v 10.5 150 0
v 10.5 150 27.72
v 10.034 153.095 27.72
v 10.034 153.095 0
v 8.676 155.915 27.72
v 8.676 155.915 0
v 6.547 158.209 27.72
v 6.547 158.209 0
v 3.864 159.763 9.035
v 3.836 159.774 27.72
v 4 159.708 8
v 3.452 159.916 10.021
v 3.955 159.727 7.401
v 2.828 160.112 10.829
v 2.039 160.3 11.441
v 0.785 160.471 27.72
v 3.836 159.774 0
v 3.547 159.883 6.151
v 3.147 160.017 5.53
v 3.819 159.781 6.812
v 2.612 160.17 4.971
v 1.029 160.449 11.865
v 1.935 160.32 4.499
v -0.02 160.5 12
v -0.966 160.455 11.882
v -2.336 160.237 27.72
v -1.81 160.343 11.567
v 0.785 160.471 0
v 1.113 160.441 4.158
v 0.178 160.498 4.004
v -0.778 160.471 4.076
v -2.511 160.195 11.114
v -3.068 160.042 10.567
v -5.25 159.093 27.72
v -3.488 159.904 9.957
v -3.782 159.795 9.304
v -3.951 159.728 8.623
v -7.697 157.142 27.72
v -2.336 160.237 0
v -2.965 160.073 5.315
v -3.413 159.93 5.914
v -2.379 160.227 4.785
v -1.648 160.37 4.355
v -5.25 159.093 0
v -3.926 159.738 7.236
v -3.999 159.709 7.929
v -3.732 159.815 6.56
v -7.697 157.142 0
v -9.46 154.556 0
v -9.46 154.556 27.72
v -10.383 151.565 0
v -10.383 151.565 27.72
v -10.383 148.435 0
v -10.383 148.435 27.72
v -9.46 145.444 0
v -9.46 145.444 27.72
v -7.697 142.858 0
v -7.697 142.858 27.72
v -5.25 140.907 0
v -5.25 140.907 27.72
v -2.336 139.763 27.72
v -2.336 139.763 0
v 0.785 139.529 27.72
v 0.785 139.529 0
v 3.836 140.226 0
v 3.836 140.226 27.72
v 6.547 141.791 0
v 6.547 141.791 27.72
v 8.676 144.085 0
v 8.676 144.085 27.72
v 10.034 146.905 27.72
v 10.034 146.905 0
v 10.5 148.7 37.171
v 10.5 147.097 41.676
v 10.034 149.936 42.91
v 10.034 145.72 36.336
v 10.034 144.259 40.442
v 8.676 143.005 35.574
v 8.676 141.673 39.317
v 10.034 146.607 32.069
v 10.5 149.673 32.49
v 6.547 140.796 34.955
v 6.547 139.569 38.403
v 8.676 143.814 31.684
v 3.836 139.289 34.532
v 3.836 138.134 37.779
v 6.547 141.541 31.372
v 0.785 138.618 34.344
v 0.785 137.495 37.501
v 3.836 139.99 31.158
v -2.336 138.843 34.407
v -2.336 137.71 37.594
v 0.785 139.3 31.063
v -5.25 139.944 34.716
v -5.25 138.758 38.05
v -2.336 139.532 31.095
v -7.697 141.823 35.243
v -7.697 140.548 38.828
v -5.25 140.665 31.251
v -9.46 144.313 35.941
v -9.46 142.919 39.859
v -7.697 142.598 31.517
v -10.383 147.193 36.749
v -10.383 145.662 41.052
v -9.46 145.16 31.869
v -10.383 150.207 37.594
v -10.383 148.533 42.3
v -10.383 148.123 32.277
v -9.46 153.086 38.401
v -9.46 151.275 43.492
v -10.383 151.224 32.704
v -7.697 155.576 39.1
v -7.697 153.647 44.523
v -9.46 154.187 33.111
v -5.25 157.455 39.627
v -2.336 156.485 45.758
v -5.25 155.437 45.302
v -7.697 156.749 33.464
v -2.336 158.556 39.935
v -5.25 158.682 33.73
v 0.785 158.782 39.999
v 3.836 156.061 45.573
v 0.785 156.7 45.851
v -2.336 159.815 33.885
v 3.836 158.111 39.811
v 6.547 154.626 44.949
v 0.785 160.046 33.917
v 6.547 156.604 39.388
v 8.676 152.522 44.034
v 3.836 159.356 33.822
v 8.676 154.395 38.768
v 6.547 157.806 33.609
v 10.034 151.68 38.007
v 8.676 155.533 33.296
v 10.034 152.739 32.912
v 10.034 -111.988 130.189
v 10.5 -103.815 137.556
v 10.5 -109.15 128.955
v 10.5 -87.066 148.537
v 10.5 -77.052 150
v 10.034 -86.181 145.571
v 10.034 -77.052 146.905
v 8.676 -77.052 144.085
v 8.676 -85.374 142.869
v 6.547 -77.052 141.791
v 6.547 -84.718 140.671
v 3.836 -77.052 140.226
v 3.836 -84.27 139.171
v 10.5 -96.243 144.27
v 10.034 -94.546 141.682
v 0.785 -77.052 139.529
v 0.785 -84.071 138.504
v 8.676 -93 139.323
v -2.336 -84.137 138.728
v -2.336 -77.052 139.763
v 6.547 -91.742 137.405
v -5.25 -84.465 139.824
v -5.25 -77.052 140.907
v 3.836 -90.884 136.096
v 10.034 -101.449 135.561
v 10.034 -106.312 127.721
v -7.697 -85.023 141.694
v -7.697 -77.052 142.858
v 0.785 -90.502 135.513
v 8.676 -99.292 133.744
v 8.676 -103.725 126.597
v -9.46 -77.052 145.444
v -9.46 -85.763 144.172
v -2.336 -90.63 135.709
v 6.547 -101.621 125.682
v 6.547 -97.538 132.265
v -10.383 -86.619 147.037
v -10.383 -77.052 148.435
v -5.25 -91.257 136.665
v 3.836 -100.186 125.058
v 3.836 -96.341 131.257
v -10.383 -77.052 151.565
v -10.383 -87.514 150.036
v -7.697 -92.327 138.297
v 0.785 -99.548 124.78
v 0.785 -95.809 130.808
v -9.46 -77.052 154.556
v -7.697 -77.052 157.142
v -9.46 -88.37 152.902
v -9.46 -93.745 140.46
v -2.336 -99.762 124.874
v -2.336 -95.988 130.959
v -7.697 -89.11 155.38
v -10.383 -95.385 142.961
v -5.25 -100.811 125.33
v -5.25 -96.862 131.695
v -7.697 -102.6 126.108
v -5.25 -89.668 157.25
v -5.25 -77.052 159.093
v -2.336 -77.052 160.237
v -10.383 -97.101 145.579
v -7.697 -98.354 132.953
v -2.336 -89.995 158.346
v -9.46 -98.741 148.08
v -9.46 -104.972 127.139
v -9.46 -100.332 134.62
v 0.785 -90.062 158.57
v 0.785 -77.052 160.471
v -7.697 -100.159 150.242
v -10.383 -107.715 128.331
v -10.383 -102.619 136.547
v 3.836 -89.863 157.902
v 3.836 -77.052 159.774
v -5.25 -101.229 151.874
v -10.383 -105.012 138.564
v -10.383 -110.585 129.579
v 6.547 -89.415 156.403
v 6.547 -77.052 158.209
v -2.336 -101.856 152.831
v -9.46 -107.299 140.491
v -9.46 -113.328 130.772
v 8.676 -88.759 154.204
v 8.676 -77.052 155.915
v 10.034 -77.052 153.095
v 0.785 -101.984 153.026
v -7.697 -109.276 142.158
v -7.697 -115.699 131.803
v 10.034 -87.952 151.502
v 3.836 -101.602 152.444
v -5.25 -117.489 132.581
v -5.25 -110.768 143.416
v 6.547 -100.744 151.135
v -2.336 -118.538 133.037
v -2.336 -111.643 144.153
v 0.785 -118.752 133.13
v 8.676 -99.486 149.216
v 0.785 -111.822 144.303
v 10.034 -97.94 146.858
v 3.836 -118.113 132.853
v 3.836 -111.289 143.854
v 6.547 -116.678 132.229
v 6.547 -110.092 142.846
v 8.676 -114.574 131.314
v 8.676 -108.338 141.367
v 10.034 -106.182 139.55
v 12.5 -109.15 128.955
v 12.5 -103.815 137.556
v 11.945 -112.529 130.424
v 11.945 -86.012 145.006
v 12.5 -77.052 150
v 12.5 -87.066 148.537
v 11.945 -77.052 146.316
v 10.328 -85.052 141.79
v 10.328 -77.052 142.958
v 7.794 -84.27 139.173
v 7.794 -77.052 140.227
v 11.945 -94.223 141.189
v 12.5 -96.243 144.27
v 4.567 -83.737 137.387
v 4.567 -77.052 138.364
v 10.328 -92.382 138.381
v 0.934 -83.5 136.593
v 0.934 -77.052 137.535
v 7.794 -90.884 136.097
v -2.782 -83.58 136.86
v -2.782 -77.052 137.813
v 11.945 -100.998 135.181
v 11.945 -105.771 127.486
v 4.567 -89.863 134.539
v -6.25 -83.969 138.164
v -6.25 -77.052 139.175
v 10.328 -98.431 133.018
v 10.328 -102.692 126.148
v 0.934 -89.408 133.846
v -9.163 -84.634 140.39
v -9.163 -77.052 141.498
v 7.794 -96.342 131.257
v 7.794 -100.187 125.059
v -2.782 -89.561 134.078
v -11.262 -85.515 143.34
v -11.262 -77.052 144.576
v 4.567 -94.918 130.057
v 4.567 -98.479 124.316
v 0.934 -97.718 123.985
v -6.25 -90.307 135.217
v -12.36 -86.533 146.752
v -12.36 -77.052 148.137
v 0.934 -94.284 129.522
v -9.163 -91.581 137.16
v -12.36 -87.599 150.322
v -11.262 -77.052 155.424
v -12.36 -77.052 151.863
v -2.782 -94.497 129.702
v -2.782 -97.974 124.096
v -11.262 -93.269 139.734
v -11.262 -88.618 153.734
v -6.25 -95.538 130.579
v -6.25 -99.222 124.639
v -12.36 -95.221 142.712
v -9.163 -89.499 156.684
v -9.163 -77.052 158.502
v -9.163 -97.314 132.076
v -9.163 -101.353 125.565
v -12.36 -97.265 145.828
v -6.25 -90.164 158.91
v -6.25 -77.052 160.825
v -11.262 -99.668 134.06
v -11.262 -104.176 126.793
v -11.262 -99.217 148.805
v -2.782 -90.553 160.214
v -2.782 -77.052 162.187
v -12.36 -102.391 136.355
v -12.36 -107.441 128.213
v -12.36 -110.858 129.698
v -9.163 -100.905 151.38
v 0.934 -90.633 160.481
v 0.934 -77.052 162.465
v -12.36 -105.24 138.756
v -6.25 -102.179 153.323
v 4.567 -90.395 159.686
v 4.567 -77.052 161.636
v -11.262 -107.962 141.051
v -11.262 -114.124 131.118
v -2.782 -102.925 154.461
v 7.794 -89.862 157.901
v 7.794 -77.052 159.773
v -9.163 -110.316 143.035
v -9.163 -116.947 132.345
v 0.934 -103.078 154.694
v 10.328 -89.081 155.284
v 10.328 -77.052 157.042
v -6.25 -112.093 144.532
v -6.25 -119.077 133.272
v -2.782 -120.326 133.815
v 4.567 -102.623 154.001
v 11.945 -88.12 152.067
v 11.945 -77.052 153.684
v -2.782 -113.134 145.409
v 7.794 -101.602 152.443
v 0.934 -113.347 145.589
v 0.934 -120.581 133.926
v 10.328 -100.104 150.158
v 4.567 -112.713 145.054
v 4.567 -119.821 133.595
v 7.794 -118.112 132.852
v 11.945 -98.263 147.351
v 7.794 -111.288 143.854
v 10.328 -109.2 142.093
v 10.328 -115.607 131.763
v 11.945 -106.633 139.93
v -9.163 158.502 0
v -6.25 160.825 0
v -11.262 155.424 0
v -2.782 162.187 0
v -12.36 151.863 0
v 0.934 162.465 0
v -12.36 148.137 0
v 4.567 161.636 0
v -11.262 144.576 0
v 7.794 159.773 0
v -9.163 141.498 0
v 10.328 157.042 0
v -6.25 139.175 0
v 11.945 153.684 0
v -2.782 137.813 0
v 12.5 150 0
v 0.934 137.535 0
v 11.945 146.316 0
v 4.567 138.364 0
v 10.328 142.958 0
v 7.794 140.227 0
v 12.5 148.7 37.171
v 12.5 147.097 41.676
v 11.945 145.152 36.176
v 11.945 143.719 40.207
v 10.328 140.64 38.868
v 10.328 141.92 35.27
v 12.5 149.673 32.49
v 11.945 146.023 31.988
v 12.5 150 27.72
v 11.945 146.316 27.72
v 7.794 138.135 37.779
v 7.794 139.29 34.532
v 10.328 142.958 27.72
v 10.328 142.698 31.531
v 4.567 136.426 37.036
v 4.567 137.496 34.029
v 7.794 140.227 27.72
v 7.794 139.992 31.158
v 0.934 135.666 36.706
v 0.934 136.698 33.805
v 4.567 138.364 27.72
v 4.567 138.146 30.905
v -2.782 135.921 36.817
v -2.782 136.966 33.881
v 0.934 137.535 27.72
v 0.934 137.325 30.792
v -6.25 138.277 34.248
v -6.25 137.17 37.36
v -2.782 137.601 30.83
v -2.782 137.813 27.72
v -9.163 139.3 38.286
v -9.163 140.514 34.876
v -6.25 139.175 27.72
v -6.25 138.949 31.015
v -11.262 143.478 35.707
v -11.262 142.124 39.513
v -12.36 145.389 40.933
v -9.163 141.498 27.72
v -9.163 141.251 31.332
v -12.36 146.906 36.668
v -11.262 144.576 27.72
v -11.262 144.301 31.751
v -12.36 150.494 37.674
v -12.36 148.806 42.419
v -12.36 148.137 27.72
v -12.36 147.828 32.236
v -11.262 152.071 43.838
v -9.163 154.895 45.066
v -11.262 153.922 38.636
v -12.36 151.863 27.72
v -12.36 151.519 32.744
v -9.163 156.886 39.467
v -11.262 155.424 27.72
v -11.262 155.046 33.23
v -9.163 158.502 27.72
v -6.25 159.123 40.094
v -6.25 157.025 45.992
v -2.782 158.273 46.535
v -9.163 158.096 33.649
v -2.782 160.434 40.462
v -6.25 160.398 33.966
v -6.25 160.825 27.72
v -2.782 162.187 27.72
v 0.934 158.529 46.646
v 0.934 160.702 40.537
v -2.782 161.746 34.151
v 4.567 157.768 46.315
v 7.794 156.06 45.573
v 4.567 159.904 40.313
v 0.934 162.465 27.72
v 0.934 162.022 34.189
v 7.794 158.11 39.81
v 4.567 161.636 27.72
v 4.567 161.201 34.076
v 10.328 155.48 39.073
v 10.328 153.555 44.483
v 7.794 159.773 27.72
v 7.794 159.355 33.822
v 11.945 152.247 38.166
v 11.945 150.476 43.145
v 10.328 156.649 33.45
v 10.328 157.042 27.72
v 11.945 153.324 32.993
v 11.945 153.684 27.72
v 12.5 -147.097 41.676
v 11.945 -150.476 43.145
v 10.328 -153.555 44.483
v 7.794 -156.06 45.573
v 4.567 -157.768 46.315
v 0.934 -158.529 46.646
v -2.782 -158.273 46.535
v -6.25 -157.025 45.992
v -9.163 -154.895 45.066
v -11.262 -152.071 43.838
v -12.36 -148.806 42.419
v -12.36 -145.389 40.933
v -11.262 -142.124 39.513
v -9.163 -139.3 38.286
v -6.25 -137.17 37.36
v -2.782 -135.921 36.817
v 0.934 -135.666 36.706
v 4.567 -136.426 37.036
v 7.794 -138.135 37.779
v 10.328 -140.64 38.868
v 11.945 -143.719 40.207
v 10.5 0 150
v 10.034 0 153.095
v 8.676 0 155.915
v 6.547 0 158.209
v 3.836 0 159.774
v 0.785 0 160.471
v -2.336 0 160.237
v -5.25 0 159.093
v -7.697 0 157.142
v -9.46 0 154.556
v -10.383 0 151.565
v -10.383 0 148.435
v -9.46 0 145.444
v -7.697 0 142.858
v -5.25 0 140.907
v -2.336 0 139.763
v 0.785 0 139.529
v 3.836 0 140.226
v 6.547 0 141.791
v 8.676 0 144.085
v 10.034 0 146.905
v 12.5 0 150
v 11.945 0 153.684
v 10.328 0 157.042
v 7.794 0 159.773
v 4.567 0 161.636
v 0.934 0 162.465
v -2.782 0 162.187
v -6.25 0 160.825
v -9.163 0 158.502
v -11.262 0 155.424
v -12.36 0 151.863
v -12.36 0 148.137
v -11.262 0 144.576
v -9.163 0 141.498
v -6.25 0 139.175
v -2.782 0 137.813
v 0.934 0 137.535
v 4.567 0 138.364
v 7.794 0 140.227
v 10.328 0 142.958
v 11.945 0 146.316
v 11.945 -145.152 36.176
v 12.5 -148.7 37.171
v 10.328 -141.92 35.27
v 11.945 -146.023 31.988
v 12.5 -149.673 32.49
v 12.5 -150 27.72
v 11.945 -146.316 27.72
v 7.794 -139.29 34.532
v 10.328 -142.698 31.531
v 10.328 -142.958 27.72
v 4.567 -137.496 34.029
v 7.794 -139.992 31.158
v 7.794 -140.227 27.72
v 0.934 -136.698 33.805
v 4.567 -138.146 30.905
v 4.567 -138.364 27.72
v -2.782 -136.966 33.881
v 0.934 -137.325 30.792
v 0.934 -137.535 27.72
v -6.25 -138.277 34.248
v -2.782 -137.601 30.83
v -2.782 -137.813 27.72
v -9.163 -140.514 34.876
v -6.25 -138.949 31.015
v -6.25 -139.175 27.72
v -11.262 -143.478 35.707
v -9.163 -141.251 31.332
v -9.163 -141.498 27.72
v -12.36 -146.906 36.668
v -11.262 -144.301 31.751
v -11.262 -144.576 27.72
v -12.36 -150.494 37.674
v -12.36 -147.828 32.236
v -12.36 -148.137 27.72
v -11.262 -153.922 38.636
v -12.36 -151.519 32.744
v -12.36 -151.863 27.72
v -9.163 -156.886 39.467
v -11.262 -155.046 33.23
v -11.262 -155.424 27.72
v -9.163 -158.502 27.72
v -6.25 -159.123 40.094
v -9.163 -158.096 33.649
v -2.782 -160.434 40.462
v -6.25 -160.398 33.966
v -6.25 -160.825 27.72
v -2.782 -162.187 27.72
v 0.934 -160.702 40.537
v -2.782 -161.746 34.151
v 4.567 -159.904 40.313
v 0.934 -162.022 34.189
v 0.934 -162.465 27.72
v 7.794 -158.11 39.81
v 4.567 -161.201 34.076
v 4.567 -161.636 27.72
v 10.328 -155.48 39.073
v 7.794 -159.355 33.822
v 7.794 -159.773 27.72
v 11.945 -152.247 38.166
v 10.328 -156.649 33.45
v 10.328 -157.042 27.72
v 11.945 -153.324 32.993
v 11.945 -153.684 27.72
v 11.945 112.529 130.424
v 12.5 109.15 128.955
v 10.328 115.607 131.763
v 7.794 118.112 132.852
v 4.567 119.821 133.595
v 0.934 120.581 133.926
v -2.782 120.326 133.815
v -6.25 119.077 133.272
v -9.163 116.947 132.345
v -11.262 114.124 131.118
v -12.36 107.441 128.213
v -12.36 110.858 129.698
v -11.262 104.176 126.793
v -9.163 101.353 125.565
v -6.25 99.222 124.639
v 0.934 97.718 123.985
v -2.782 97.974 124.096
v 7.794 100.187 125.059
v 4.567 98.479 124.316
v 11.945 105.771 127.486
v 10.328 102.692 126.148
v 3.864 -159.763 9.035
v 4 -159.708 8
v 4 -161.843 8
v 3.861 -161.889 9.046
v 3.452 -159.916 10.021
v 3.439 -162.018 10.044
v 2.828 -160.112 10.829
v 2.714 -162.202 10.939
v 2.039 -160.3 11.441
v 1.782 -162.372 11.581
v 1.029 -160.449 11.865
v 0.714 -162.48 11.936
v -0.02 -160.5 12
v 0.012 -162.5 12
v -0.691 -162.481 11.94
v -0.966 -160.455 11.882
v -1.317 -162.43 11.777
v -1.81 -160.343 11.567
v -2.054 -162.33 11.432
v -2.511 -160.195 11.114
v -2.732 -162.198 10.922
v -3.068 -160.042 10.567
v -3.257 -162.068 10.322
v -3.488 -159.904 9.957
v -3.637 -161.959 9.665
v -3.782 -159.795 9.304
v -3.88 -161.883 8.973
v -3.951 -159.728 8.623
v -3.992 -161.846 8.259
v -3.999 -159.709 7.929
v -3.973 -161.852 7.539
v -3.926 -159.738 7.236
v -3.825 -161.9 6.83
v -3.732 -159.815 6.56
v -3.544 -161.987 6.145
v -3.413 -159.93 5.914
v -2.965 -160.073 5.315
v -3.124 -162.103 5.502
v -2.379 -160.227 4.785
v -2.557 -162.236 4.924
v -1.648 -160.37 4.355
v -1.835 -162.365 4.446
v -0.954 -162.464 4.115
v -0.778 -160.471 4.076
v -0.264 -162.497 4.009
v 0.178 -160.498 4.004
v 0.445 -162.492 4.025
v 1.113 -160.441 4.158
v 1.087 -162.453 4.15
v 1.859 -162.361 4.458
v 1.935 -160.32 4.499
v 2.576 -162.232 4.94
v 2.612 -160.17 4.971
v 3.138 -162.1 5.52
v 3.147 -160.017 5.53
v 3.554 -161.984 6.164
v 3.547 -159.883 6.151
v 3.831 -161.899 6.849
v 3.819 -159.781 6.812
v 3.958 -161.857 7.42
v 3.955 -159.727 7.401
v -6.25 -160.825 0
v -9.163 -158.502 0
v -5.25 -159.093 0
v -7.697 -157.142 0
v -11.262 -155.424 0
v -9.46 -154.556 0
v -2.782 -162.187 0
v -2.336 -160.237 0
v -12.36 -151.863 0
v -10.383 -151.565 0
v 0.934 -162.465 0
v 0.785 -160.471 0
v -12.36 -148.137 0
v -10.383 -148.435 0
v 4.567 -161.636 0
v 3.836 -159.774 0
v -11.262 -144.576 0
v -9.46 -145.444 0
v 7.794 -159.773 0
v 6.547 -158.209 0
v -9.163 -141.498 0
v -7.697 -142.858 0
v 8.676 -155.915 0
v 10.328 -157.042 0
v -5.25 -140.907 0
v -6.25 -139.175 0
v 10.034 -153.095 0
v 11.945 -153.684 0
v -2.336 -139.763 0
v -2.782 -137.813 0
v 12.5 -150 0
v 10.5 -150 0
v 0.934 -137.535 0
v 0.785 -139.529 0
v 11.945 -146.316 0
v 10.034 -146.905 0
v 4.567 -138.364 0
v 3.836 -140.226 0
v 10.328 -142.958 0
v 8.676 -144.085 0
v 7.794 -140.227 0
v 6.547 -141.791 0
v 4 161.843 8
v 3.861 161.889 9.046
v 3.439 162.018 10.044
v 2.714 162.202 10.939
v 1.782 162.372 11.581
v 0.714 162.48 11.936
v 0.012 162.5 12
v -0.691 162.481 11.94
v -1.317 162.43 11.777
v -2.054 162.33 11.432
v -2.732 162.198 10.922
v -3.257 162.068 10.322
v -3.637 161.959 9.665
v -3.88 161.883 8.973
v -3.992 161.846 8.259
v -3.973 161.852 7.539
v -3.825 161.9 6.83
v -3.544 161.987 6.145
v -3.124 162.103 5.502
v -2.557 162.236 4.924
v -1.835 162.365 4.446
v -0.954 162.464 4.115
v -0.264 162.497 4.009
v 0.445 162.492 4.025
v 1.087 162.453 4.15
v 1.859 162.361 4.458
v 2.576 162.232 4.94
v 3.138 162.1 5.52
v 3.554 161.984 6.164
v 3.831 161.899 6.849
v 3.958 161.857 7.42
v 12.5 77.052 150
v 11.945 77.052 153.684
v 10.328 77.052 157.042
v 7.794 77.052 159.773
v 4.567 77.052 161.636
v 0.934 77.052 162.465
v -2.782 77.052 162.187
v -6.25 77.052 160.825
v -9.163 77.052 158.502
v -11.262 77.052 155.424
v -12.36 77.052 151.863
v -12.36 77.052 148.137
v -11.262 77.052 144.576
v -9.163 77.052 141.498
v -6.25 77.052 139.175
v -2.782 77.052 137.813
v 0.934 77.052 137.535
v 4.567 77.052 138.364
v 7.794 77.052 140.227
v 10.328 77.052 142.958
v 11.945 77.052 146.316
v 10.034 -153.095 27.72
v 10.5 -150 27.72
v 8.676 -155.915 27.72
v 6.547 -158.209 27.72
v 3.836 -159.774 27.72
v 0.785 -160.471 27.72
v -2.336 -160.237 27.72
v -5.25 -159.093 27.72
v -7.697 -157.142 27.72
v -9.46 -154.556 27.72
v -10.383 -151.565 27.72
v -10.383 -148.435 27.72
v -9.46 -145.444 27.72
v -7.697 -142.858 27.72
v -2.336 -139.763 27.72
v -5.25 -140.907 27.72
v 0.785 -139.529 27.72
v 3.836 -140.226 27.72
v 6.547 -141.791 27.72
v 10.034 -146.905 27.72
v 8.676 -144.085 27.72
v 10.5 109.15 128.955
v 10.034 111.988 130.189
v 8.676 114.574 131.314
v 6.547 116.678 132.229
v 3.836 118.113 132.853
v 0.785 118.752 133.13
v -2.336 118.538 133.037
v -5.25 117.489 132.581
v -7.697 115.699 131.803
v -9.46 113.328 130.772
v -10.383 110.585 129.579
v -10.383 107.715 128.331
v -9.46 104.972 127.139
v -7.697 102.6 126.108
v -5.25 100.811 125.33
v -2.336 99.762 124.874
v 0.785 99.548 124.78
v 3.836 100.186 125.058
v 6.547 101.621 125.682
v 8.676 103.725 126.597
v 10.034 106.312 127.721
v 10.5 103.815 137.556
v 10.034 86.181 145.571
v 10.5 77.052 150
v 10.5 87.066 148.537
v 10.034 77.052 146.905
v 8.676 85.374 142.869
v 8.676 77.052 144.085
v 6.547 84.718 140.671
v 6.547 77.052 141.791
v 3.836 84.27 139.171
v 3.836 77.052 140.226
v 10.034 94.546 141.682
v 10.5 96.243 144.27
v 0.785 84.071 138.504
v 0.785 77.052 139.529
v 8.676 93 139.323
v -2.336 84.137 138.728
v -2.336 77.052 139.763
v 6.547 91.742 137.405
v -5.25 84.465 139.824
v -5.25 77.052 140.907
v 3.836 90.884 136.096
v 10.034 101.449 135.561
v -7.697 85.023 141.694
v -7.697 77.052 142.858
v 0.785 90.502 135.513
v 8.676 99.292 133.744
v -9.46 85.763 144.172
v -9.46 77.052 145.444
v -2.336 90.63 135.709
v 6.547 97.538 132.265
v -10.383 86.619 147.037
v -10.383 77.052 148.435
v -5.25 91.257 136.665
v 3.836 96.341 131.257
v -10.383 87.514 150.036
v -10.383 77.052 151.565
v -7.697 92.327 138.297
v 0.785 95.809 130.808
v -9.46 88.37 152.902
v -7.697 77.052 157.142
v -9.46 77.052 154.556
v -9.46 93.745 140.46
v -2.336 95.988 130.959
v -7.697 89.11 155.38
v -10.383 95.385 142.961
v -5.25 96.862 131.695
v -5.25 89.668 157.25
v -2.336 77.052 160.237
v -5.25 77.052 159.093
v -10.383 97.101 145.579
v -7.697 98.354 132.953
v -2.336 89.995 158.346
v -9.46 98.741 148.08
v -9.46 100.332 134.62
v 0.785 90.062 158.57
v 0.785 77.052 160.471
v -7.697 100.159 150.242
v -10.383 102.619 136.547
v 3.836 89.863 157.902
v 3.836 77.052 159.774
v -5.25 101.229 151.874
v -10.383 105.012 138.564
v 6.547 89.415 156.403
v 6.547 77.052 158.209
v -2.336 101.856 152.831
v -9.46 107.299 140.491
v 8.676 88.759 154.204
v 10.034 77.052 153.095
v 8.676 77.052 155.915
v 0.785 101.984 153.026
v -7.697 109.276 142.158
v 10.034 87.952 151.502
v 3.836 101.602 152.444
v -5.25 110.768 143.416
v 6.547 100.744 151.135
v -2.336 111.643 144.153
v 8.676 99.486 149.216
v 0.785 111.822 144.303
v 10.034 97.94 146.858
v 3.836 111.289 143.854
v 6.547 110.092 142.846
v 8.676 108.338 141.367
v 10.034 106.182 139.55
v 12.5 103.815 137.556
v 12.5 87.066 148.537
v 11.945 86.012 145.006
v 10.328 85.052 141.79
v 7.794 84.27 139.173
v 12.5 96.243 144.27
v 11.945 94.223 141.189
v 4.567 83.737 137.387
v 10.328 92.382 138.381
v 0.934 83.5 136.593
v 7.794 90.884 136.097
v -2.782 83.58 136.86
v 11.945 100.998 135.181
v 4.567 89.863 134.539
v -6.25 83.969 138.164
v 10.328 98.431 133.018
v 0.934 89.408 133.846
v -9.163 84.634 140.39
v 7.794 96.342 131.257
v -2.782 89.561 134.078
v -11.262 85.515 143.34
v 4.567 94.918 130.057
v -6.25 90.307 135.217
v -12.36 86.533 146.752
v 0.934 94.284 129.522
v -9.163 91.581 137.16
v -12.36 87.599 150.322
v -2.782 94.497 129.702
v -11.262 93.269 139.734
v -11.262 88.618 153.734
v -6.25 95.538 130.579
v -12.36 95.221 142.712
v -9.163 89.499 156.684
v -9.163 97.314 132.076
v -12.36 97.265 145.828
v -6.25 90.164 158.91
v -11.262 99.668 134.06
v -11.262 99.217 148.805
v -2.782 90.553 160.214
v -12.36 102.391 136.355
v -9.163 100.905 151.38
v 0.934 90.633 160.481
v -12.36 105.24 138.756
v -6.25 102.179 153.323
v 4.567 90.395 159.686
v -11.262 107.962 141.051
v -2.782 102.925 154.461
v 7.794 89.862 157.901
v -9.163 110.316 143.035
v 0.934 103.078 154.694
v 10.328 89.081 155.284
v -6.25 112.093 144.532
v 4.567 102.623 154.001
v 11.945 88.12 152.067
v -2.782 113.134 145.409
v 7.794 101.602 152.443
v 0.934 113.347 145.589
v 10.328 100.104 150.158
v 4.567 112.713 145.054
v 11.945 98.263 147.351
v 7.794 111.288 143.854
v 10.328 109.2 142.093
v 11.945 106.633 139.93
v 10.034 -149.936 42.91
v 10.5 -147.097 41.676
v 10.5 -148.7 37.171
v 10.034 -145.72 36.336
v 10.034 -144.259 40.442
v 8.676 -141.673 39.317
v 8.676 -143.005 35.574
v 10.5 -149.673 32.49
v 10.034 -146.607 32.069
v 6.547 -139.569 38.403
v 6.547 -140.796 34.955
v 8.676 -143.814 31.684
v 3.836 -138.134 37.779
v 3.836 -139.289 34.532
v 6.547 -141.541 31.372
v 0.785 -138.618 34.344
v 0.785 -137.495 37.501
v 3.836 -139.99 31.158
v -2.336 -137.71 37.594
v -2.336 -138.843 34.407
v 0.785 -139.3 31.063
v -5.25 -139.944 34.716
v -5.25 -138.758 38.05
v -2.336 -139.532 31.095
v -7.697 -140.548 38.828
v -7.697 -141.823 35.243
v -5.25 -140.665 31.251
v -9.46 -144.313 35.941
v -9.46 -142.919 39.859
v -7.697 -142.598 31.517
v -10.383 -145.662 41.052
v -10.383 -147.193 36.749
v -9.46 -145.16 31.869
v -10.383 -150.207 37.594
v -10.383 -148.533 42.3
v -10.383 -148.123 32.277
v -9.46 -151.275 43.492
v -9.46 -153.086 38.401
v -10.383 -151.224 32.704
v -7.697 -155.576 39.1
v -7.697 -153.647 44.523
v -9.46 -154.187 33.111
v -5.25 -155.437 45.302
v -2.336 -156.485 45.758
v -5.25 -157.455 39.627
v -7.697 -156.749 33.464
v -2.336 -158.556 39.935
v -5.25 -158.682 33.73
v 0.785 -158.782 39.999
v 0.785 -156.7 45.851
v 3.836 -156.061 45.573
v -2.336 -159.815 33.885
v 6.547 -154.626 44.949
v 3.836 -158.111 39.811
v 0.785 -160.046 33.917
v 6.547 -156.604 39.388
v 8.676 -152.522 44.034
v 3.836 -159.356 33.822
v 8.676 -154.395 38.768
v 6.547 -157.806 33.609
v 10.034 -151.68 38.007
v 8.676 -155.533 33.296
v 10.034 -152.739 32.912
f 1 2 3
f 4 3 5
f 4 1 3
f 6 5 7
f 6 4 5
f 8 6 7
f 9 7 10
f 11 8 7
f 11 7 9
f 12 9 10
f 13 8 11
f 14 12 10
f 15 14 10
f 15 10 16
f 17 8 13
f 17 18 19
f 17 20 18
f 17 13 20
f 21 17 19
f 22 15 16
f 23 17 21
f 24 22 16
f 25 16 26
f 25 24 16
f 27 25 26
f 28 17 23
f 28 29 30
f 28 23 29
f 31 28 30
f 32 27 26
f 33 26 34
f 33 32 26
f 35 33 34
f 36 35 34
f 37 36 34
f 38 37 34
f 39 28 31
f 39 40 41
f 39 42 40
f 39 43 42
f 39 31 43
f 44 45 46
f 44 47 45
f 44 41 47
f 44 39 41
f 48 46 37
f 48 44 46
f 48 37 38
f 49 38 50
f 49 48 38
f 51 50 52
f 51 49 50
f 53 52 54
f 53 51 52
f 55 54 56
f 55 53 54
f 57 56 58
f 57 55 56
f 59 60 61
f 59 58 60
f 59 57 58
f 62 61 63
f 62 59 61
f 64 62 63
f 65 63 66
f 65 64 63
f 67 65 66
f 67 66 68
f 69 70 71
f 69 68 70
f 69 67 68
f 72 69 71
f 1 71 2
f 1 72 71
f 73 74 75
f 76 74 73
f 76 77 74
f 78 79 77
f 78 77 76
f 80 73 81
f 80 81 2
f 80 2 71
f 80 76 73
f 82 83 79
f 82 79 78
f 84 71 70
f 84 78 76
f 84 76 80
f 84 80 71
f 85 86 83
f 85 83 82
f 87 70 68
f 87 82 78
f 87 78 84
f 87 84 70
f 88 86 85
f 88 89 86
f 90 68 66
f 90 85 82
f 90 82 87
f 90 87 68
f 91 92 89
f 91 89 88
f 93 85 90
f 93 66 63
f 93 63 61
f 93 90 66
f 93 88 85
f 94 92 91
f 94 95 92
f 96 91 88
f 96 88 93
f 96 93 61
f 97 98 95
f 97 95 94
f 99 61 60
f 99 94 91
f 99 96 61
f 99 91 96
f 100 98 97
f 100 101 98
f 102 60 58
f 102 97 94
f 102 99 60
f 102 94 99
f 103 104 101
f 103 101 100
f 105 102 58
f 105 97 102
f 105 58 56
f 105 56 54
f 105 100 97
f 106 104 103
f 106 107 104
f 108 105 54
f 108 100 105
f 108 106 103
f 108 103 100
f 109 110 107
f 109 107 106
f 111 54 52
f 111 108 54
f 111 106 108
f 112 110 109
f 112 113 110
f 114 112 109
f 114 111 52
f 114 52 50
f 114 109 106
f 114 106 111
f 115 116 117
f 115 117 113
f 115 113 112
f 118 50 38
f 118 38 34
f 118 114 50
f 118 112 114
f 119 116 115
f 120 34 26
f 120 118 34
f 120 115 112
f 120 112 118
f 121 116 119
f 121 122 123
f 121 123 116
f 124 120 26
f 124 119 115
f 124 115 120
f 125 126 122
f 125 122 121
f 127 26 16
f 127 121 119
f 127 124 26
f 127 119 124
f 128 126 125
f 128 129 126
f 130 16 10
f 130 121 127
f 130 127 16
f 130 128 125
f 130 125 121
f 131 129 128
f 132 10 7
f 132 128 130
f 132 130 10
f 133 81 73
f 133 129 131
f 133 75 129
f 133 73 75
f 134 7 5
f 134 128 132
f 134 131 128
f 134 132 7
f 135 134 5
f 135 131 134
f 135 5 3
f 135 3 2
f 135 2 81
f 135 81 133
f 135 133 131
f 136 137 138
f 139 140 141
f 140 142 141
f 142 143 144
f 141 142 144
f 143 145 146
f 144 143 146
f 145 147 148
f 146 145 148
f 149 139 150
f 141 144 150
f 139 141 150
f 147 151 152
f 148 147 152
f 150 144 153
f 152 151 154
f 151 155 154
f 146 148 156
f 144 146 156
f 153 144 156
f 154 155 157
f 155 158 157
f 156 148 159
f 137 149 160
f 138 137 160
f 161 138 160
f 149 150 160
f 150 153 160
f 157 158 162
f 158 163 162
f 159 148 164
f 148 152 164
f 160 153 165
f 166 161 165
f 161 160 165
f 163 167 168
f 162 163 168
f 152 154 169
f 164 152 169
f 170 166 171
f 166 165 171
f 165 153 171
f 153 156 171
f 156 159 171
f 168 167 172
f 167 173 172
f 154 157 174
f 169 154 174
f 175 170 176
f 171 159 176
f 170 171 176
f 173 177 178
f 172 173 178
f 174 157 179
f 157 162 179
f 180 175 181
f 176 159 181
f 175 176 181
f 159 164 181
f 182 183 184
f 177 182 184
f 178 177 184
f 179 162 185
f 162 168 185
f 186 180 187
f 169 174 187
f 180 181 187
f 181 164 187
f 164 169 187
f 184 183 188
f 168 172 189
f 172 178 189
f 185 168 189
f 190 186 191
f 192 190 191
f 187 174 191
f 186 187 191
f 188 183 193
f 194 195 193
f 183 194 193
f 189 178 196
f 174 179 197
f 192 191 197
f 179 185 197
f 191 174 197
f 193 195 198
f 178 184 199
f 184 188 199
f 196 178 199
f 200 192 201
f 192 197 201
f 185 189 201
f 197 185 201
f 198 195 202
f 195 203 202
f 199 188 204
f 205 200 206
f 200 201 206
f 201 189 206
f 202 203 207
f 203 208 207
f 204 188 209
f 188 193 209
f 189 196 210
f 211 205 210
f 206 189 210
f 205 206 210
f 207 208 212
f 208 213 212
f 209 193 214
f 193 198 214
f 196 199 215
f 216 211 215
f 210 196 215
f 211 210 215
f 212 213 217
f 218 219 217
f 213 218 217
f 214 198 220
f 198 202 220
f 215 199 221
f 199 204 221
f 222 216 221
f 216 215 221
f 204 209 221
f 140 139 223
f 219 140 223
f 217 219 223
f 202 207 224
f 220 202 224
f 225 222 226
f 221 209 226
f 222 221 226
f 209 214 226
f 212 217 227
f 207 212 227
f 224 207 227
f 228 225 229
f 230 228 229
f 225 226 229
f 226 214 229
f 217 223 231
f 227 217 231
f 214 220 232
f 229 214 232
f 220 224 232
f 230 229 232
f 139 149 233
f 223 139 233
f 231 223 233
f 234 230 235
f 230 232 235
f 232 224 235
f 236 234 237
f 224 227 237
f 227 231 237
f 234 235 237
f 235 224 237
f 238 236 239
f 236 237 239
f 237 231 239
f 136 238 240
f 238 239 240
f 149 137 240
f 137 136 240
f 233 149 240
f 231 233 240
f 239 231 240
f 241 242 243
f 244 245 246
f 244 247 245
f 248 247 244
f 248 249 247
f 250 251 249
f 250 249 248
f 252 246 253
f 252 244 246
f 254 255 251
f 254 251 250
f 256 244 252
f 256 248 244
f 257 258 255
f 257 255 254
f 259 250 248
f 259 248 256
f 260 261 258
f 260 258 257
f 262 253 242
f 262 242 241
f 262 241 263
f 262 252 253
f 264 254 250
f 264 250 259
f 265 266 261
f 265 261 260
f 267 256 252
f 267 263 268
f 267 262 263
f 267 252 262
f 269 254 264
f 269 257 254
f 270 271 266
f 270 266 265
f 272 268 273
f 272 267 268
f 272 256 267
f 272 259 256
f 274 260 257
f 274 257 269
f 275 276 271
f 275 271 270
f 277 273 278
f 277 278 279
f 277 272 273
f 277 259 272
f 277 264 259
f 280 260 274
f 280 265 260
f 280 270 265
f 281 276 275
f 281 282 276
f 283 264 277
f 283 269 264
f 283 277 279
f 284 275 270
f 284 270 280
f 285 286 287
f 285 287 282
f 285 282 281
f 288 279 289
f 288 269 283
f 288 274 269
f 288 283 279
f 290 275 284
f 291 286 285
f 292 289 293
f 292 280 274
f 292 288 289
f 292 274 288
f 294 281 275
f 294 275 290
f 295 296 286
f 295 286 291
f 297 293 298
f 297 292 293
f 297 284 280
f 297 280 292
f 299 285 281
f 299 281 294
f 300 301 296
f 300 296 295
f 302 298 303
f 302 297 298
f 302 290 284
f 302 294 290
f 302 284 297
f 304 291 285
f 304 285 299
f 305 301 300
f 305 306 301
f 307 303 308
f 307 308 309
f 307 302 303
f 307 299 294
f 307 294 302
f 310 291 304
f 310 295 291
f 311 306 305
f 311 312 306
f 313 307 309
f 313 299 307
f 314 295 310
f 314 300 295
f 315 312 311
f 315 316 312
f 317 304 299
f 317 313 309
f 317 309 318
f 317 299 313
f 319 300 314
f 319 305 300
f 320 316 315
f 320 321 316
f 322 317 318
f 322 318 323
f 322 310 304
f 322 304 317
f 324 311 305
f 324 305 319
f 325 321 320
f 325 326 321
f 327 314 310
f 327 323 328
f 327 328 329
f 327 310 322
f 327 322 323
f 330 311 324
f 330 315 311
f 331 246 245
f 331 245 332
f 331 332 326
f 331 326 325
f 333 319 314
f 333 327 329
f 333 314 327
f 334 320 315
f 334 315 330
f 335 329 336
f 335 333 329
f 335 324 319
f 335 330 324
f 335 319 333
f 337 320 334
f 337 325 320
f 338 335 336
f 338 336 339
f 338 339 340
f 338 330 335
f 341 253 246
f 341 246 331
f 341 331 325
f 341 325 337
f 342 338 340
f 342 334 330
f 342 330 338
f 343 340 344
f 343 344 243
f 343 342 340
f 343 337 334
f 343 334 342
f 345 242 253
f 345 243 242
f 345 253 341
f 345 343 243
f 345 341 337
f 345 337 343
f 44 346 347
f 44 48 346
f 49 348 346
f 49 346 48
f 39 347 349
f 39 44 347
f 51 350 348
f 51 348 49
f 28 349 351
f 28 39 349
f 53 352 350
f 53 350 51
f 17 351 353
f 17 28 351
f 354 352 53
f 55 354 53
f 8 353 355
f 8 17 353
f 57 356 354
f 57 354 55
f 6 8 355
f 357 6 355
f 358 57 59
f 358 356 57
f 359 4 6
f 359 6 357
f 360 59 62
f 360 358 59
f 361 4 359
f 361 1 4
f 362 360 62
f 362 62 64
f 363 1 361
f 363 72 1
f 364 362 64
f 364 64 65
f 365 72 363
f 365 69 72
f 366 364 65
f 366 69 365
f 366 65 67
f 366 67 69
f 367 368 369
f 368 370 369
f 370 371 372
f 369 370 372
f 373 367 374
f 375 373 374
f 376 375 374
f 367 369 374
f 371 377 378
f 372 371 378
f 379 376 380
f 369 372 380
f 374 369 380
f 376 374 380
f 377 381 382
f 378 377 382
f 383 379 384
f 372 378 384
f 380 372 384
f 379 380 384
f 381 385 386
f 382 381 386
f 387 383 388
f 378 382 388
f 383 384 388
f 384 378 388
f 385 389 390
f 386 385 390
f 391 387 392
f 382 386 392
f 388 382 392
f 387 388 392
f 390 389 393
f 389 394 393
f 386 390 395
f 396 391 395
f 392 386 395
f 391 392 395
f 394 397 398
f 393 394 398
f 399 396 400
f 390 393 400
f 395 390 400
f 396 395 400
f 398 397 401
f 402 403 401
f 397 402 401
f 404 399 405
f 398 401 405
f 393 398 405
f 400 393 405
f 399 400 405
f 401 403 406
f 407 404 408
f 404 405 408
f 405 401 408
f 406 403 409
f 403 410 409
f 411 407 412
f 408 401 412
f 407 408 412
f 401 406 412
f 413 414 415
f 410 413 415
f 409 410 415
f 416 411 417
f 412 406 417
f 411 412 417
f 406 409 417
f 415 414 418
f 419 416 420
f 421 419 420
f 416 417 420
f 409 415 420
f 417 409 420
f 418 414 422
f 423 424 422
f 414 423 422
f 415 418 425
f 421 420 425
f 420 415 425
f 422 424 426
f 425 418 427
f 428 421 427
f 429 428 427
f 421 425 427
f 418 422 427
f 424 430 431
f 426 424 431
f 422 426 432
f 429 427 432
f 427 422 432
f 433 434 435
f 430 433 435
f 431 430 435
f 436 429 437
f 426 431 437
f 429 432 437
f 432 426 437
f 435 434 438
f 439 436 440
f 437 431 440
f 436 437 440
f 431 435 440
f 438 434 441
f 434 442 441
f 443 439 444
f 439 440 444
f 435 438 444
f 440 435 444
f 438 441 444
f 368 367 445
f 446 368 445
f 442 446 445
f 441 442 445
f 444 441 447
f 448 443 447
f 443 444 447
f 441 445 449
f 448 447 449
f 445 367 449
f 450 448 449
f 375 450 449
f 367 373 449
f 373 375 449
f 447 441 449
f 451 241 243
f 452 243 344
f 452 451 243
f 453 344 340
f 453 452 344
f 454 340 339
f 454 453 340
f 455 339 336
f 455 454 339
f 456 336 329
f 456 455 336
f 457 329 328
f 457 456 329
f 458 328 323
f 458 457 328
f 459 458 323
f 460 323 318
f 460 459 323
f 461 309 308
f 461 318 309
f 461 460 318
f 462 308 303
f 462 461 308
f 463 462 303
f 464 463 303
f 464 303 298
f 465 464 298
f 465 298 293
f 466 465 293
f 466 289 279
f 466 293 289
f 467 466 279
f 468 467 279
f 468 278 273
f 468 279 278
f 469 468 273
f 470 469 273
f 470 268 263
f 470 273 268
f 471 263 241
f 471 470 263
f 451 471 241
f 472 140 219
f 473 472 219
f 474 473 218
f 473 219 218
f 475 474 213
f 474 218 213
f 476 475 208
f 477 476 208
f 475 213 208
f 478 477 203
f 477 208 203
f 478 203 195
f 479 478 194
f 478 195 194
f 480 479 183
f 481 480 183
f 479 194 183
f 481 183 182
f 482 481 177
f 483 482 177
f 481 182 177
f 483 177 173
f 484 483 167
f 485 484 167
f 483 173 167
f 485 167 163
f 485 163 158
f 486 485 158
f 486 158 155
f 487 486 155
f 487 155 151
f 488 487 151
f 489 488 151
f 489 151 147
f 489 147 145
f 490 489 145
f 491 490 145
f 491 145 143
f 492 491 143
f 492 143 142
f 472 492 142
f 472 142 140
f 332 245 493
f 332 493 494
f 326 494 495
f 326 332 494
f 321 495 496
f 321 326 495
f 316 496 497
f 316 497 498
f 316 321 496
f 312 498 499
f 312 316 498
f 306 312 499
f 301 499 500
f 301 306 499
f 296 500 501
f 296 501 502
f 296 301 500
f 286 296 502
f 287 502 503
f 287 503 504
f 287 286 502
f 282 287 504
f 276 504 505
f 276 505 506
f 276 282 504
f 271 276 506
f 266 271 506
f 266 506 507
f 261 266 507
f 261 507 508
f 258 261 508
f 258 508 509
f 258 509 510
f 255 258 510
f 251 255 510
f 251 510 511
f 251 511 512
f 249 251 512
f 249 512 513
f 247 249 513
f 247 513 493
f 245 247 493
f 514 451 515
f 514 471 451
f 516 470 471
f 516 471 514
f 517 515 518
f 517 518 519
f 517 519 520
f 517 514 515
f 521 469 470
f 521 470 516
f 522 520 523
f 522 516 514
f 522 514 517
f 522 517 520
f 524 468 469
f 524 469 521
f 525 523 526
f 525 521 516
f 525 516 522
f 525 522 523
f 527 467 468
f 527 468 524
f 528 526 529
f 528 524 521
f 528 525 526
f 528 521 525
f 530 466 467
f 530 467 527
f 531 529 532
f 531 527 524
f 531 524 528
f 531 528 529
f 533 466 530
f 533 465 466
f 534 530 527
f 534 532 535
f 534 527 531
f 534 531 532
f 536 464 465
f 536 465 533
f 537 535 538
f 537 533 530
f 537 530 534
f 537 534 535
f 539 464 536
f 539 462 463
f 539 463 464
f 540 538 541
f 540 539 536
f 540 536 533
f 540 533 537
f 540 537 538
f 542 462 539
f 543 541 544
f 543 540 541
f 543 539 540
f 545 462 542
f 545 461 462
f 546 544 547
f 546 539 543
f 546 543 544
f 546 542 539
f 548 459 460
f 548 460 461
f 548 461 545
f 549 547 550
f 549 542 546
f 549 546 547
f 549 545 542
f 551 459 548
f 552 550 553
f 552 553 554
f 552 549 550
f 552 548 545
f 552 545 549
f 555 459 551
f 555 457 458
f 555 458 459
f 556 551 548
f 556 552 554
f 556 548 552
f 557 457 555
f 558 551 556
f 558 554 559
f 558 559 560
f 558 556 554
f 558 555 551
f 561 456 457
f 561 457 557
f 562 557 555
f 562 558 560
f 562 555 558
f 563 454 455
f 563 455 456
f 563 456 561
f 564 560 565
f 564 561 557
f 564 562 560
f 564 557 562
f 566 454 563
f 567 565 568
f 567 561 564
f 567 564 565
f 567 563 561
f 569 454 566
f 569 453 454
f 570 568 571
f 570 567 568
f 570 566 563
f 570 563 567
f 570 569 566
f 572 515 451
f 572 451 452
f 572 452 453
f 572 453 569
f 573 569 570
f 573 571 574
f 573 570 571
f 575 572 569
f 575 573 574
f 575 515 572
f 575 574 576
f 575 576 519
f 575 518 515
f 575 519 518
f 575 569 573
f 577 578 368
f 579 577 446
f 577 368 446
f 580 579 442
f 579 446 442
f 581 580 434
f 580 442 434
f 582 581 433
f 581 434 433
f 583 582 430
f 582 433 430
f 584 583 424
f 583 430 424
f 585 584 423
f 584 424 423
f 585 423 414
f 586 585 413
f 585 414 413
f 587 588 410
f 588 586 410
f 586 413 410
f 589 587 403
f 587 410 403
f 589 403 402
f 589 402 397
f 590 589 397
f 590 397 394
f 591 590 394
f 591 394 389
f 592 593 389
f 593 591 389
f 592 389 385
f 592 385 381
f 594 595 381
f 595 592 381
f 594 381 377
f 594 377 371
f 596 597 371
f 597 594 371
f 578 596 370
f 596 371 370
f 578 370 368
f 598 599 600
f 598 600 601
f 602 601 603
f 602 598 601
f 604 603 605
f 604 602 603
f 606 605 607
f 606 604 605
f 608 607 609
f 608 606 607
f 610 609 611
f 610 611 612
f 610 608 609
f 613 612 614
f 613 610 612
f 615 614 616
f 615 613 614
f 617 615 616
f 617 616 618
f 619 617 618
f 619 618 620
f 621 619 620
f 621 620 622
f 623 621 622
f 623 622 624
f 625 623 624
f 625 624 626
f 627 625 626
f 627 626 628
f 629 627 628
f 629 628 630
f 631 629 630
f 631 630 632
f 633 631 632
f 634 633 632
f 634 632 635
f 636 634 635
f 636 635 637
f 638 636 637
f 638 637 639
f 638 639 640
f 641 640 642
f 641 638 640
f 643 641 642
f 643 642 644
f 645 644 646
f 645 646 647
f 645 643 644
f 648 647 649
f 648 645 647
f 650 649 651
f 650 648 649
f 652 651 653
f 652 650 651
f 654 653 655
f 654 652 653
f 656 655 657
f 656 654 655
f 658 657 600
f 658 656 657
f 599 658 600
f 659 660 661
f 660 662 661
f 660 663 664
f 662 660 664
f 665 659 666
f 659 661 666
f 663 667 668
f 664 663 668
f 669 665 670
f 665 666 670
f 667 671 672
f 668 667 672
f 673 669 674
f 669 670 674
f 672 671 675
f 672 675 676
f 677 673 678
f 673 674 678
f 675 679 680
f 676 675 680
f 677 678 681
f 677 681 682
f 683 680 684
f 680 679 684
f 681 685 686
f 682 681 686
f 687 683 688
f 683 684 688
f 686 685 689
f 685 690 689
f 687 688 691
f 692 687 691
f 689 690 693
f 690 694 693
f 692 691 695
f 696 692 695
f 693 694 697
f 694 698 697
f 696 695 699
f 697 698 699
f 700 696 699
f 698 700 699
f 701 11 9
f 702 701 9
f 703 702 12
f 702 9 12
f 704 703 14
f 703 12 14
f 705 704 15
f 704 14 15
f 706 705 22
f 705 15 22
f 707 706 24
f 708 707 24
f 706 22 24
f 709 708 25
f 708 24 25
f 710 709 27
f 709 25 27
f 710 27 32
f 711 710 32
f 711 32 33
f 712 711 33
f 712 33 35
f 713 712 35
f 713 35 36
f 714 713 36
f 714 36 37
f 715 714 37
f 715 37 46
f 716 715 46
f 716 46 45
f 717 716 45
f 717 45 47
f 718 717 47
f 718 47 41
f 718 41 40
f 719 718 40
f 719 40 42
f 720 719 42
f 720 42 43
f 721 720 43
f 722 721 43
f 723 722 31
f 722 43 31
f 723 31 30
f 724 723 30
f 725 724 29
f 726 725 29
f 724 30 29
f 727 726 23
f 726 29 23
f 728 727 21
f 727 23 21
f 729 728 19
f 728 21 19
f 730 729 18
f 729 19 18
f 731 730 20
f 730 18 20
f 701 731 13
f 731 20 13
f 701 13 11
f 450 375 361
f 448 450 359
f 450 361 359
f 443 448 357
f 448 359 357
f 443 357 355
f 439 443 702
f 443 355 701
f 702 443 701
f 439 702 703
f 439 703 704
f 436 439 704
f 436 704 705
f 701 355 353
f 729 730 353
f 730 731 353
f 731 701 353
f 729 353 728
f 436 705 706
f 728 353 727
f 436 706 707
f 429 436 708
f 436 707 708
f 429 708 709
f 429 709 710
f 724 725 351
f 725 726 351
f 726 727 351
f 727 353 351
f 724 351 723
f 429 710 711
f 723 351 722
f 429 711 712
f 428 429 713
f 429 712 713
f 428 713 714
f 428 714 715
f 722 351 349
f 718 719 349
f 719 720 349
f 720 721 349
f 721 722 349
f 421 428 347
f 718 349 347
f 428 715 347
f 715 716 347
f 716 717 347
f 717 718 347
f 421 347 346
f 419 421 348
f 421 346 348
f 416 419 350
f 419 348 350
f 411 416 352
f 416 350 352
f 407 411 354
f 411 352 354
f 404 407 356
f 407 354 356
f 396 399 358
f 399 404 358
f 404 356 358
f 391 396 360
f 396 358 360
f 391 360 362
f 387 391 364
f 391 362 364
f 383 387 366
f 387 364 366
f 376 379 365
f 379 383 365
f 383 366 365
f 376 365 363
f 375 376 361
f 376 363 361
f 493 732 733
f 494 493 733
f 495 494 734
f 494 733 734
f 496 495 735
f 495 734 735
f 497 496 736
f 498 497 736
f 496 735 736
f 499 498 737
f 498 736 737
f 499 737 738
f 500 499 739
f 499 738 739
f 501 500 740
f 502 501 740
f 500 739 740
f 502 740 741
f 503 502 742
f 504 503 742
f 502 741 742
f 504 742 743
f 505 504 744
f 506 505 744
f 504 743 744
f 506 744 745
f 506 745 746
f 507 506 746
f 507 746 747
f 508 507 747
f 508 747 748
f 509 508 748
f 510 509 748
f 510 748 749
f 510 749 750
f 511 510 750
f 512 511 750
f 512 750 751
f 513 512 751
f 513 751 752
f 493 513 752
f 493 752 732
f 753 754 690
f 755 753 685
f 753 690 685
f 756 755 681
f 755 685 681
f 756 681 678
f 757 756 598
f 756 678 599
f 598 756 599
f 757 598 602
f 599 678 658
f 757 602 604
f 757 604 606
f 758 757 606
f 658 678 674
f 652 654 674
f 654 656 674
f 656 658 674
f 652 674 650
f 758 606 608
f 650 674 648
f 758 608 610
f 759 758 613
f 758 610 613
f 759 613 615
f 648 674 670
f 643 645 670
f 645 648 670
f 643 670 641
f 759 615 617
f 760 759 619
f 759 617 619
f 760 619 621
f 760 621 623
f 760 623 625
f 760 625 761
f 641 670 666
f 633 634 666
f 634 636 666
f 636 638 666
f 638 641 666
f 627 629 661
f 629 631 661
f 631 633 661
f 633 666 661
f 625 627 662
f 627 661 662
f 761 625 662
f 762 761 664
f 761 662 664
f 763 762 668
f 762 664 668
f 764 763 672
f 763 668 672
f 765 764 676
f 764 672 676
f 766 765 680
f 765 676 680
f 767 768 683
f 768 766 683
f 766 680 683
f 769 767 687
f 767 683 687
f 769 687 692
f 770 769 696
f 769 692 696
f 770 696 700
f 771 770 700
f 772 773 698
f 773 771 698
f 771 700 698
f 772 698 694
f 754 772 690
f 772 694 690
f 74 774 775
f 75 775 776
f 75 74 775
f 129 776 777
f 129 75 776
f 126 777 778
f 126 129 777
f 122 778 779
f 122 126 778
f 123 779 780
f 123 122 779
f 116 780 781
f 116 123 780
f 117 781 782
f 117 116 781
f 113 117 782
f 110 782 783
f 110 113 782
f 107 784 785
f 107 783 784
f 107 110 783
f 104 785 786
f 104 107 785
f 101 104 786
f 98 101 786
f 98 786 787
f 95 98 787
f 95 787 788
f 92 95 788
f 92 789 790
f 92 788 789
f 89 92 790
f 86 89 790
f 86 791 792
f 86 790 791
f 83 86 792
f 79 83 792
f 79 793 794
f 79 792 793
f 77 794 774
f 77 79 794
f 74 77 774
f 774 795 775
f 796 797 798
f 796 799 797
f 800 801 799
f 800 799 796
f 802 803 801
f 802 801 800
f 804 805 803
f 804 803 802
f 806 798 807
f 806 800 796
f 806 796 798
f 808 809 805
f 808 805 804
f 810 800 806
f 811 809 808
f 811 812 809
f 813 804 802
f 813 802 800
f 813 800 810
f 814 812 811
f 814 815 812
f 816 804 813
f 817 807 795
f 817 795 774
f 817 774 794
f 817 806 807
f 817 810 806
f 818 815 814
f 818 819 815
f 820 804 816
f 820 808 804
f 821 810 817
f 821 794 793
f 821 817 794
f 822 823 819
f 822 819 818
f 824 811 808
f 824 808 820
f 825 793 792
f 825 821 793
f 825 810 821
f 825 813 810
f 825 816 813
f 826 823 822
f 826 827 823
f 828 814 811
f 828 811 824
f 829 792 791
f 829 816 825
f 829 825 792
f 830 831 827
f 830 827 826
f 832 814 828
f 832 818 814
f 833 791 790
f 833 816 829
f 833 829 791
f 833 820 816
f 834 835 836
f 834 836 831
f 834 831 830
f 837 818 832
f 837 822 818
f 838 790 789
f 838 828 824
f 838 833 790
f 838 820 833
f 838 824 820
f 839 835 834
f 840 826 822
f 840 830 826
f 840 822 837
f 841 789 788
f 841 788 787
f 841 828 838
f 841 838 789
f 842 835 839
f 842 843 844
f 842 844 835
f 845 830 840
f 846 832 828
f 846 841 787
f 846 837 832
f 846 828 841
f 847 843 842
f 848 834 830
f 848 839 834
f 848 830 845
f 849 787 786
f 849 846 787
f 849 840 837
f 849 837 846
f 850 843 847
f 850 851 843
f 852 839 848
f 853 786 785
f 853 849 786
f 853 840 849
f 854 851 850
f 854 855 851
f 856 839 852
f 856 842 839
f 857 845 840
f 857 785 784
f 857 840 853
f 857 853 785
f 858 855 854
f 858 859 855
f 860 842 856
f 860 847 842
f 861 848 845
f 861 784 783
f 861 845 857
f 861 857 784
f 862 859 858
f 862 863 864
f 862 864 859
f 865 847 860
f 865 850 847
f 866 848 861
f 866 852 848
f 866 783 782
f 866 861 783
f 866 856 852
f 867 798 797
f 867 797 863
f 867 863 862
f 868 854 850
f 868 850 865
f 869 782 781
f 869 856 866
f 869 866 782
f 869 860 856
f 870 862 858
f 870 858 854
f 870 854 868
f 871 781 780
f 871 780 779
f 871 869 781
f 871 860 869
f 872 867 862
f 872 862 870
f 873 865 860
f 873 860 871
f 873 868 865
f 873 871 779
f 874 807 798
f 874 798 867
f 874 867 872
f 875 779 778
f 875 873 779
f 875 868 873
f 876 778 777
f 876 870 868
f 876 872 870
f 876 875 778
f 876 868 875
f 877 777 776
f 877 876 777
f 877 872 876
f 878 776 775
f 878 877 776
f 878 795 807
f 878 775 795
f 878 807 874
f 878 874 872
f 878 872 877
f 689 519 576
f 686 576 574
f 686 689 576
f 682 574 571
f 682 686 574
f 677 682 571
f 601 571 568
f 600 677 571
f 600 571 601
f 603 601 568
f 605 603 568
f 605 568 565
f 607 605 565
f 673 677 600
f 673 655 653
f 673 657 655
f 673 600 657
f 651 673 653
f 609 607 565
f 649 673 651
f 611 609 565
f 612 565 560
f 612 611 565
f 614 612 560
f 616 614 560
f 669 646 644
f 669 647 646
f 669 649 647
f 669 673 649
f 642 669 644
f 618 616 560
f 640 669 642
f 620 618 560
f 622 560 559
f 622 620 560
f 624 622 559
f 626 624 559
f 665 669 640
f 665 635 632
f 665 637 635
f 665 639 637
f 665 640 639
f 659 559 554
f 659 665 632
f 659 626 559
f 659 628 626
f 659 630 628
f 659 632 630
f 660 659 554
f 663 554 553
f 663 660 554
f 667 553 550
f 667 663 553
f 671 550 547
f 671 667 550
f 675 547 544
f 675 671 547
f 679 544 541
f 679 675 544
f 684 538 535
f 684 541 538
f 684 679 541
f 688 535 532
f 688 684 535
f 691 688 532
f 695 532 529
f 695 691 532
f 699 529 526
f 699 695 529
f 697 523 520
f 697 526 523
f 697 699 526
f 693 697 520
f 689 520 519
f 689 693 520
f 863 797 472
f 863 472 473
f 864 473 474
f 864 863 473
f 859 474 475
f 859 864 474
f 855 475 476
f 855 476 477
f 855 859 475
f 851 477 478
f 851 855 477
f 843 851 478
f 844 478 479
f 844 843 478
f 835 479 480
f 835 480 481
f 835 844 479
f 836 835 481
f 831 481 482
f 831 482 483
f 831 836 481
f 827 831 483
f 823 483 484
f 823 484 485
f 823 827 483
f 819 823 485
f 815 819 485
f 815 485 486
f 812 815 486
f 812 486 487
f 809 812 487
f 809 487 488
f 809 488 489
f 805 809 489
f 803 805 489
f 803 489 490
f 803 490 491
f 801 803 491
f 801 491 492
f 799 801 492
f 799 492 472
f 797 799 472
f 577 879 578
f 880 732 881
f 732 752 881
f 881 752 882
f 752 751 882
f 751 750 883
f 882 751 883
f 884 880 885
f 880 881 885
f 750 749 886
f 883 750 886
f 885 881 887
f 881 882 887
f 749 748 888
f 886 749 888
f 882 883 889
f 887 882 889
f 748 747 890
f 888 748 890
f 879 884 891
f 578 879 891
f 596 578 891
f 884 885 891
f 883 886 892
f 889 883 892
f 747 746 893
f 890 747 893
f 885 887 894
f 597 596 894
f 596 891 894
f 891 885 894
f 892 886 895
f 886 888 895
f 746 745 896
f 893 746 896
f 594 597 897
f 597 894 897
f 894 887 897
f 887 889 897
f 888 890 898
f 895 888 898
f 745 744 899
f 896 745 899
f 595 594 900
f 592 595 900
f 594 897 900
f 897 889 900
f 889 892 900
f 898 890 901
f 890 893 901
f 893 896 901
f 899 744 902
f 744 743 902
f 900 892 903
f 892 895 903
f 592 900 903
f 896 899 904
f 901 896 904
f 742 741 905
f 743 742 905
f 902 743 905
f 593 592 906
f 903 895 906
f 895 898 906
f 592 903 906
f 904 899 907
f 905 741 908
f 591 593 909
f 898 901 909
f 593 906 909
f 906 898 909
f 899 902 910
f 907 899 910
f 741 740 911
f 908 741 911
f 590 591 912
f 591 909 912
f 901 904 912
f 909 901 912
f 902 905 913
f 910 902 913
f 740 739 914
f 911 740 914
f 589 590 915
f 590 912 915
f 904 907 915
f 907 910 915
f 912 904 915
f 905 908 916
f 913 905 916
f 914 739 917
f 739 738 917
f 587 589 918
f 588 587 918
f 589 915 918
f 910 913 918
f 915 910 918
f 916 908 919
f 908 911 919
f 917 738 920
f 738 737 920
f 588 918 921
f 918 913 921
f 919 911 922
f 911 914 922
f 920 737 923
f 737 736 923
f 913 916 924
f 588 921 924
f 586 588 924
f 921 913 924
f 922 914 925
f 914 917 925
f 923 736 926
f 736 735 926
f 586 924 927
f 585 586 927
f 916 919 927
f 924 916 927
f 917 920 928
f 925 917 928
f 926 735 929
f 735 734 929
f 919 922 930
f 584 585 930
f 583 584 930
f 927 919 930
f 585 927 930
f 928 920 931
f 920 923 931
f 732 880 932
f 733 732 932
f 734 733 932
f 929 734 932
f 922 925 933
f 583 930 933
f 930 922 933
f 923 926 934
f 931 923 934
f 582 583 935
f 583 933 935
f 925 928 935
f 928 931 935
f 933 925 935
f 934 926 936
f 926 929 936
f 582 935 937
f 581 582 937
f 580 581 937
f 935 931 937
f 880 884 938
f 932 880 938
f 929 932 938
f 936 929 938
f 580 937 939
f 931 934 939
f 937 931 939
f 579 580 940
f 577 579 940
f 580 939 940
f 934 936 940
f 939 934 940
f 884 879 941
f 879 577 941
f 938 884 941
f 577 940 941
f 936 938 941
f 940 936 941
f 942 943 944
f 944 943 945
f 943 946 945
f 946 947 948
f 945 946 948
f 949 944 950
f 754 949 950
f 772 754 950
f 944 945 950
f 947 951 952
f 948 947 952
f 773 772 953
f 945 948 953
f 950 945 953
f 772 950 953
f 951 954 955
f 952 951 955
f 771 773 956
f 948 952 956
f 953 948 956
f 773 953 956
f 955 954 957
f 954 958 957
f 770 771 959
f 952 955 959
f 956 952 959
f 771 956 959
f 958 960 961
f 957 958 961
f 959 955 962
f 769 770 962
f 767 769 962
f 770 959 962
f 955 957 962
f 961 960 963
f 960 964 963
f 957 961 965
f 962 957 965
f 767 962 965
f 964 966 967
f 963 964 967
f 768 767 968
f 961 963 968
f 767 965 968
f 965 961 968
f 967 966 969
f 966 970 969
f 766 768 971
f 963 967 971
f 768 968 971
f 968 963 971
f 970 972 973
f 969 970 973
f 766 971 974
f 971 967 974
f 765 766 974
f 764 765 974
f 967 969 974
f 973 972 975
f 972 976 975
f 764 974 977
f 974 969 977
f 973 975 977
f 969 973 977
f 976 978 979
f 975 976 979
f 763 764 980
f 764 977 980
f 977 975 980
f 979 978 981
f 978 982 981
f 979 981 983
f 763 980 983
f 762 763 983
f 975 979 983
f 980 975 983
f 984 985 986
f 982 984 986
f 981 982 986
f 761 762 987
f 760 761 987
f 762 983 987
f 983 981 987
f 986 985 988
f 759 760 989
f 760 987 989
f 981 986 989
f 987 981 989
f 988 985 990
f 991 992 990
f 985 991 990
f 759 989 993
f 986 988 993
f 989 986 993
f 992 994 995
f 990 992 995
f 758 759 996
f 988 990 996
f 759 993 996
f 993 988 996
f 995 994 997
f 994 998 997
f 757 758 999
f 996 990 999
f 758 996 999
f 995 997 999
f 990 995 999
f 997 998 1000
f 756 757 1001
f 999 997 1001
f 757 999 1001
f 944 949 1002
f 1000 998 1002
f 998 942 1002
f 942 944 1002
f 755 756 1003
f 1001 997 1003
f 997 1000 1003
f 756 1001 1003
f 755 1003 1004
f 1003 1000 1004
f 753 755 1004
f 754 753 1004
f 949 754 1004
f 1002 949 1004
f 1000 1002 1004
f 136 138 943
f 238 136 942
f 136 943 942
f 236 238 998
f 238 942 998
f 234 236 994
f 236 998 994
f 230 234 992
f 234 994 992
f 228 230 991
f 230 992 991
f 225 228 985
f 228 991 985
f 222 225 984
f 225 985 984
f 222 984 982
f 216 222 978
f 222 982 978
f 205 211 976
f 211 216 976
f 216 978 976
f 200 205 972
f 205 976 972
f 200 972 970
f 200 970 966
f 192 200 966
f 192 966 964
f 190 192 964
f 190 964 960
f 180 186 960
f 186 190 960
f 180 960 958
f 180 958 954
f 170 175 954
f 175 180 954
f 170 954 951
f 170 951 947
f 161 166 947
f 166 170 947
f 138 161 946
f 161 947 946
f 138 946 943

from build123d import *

# Parameters (mm, degrees)
F1_R     = 12.5
F1_R_2   = 10.5
F4_R     = 4
F5_DEPTH = 12.5010001


with BuildPart() as f2:
    # F2: sweep along a path in F0
    with BuildLine(Plane.YZ) as f2_path:
        Line((0, 150), (-77.0523680748, 150))
        ThreePointArc((-77.0523680748, 150), (-96.2429974746, 144.269775251), (-109.1498200437, 128.9554138995))
        Line((-109.1498200437, 128.9554138995), (-147.0974519689, 41.6758604716))
        ThreePointArc((-147.0974519689, 41.6758604716), (-149.2666807476, 34.8474789521), (-150, 27.7204465721))
        Line((-150, 27.7204465721), (-150, 0))
    # F1 (on Top) → F2 (sweep)
    with BuildSketch(Plane.XY):
        with Locations((0, -150)):
            Circle(F1_R)
        with Locations((0, -150)):
            Circle(F1_R_2, mode=Mode.SUBTRACT)
    sweep(path=f2_path.line)

    # F4 (on plane+point) → F5 (cut, through all)
    with BuildSketch(Plane.XZ.offset(150)):
        with Locations((0, 8)):
            Circle(F4_R)
    extrude(amount=F5_DEPTH, mode=Mode.SUBTRACT)

    # F6: F2 across plane


with BuildPart() as f2_1:
    add(f2.part)
    add(f2.part.mirror(Plane.XZ))


solid = f2_1.part
